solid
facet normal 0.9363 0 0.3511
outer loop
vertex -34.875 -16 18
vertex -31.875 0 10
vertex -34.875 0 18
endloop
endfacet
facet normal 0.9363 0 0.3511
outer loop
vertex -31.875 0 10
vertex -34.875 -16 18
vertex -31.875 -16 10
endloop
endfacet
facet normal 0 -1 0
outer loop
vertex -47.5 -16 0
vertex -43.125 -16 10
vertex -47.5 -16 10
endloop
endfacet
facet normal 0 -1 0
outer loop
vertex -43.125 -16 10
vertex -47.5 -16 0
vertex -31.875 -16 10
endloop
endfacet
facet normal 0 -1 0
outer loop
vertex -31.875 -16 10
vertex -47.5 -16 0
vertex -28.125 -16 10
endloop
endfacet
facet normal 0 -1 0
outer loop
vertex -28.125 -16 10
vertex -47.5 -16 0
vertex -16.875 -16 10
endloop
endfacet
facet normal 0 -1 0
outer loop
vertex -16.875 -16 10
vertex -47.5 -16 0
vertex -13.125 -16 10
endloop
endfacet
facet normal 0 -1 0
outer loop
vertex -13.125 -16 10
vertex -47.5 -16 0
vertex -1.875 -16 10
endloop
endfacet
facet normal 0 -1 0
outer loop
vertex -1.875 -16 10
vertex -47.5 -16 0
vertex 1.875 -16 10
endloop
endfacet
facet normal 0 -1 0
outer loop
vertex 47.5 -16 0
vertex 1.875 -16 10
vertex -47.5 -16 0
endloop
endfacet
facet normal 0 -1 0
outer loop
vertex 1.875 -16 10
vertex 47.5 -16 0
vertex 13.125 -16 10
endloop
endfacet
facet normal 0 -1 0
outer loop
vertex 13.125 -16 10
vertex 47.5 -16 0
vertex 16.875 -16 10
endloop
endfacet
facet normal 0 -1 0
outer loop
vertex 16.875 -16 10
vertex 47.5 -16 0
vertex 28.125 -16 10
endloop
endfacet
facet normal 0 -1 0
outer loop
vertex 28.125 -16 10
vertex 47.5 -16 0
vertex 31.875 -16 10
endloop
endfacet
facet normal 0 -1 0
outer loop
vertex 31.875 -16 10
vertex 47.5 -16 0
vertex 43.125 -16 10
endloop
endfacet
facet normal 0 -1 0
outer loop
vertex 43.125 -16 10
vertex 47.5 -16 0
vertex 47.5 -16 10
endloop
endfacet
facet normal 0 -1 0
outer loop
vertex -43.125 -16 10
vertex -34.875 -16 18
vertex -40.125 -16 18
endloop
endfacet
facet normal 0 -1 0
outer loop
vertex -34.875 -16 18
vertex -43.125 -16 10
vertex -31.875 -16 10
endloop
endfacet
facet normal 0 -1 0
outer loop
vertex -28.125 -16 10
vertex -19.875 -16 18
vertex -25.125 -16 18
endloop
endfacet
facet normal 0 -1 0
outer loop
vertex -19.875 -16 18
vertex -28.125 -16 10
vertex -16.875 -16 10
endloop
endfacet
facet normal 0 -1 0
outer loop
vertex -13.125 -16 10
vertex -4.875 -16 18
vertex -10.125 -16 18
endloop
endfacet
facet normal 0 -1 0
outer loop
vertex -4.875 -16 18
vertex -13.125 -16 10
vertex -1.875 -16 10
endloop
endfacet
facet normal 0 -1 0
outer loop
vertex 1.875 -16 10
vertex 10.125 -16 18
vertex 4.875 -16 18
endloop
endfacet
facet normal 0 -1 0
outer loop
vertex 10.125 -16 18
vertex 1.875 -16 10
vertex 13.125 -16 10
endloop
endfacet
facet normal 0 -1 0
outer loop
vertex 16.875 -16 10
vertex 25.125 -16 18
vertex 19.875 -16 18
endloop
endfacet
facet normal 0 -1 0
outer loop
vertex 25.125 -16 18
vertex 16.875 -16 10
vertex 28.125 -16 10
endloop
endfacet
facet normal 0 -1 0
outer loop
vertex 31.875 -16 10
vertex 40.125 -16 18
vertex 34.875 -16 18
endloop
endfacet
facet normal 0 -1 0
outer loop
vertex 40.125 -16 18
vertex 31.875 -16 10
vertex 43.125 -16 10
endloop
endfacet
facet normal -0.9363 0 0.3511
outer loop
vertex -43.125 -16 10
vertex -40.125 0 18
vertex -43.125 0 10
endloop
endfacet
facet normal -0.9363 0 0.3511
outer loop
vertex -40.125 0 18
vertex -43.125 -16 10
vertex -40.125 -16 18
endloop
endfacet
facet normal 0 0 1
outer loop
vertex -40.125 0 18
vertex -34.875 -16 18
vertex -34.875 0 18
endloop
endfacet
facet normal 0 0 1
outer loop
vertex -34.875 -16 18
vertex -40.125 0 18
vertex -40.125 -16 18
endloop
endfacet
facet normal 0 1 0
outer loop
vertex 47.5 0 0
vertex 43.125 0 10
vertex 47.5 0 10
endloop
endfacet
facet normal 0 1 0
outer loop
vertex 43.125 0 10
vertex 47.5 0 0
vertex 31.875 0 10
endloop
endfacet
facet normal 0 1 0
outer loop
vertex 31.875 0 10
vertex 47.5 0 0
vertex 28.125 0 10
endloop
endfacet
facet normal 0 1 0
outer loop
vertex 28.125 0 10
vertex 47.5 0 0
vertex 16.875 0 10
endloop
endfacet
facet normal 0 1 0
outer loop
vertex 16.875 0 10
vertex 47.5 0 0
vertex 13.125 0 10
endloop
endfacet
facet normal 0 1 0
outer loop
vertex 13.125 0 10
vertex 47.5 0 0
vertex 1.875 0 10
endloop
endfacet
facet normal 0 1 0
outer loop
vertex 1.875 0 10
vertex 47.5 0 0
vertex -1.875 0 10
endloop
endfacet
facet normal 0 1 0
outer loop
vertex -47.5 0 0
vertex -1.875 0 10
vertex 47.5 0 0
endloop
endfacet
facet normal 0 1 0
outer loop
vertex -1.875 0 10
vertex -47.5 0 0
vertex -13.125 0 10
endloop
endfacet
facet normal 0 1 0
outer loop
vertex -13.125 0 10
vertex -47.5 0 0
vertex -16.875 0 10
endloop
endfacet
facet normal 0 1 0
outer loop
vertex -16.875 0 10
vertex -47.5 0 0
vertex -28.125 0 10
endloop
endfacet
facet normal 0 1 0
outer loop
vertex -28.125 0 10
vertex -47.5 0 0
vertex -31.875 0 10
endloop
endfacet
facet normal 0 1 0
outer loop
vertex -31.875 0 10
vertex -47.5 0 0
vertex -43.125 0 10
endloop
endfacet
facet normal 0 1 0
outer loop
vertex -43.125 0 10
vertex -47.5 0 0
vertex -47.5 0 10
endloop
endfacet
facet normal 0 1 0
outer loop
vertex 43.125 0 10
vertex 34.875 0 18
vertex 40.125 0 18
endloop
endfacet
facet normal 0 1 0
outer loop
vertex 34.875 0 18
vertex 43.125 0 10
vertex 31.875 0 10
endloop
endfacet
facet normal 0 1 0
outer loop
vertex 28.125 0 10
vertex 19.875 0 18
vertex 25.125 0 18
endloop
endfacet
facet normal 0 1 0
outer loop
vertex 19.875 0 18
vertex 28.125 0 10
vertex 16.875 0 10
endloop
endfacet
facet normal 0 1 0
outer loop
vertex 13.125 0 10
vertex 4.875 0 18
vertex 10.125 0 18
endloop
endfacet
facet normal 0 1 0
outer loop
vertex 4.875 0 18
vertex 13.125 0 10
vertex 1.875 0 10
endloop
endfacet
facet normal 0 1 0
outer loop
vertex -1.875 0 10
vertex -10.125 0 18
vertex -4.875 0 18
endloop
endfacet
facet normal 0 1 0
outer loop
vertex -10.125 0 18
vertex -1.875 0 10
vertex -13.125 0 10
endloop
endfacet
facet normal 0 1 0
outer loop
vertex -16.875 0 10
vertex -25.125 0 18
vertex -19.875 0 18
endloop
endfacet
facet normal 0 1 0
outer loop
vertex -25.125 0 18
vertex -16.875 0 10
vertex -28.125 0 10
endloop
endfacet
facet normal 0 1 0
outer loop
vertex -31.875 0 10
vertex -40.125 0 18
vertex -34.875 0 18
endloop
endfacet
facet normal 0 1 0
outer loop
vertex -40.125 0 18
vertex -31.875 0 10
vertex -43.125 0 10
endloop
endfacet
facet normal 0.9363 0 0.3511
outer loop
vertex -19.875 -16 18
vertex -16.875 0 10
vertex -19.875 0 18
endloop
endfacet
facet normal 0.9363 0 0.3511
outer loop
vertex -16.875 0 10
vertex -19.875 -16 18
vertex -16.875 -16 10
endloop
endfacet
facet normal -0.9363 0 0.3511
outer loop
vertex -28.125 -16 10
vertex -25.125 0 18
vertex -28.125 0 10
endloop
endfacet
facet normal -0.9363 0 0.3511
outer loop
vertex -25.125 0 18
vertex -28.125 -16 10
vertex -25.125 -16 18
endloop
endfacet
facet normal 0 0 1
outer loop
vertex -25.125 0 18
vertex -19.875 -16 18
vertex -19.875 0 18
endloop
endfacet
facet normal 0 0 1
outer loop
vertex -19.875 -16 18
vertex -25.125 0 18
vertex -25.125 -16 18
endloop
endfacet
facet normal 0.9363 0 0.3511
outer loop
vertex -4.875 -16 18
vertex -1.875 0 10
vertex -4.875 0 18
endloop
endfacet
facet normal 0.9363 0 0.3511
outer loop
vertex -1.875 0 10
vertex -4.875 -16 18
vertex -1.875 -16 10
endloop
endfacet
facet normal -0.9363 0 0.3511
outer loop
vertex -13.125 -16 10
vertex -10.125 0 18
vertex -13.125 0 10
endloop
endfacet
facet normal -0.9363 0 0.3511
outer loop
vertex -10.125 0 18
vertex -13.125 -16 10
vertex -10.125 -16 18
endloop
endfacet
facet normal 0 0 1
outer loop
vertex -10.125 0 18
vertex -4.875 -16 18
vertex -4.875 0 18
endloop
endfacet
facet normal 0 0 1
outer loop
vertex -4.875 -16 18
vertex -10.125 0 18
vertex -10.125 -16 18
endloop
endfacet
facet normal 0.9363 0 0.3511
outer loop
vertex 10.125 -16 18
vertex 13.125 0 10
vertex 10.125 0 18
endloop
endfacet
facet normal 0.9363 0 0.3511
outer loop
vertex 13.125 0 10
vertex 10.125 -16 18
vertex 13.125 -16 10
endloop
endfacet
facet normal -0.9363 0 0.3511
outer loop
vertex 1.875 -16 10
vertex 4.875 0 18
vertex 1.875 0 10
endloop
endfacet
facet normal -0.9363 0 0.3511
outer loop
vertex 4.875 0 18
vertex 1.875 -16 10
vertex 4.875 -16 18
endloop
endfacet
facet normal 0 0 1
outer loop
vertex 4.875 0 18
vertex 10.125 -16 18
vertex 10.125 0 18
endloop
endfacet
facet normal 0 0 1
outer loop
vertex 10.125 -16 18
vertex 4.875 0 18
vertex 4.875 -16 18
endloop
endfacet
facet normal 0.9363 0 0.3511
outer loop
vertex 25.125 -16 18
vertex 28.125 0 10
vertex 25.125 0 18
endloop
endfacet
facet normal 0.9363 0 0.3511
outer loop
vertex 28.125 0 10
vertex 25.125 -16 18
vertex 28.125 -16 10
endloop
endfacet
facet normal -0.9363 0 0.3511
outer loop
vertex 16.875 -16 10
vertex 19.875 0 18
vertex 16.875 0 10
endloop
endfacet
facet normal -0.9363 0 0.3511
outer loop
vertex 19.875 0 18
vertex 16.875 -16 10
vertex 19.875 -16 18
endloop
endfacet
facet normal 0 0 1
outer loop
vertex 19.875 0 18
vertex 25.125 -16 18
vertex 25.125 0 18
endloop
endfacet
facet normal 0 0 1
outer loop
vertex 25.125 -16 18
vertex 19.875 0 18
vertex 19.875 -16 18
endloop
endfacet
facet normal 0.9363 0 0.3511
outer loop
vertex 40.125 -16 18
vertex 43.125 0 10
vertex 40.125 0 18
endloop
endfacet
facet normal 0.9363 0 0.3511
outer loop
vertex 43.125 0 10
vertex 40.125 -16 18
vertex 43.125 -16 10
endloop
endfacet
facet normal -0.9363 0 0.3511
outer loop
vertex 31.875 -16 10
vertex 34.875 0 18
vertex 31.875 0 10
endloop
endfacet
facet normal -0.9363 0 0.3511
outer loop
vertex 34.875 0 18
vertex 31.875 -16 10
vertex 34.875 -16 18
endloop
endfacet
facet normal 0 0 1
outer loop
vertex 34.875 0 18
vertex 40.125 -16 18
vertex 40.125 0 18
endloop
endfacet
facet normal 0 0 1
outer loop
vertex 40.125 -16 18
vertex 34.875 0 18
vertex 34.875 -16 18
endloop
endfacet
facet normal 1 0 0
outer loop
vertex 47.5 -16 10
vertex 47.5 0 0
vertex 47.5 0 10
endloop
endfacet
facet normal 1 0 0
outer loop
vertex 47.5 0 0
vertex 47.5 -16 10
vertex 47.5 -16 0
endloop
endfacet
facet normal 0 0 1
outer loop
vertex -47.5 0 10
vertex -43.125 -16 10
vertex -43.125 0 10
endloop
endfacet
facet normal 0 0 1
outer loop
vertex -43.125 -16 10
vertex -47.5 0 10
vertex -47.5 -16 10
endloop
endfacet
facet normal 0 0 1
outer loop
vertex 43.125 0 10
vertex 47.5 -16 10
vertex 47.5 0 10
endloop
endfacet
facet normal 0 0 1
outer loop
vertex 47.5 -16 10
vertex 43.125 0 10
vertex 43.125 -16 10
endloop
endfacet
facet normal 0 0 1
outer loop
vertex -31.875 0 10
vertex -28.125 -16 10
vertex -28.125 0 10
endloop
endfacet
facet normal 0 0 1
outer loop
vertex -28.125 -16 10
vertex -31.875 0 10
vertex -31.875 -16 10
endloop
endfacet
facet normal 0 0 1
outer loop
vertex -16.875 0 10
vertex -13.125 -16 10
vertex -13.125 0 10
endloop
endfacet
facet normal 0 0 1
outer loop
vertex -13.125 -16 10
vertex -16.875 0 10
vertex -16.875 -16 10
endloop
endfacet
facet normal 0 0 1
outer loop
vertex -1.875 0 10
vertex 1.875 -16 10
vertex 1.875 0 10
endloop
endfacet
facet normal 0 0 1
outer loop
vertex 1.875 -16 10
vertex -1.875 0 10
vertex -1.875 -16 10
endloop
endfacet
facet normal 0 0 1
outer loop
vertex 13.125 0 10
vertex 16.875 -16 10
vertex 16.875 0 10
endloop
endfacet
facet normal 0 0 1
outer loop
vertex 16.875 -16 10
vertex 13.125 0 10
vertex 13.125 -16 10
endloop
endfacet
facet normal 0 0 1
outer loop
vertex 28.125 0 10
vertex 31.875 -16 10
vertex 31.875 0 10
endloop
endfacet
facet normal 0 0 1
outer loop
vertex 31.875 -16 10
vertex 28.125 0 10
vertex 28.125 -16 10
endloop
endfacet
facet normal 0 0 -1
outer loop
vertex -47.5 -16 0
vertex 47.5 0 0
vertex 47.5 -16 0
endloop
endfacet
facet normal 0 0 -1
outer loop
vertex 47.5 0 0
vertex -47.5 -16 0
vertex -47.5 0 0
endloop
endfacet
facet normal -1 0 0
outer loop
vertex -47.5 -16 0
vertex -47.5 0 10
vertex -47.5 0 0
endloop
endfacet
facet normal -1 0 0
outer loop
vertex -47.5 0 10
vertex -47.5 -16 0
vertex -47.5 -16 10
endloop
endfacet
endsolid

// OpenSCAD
$fn = 32;

// ----------------------------------------------------------------------
// Toothed rack, 6 teeth
// 15 mm pitch, 8 mm teeth
// ----------------------------------------------------------------------

// --- parameters (mm) ---
bar_w = 16;      // bar width (Y)
bar_h = 10;      // bar height (Z)
teeth = 6;       // number of teeth
pitch = 15;      // tooth pitch
tooth_h = 8;     // tooth height above the bar
root_w = 12;     // tooth width at the root
crest_w = 5.25;  // tooth width at the crest

// --- derived feature positions (mm) ---
span = (teeth - 1) * pitch;  // = 75   distance between the outer teeth
bar_l = span + root_w + 8;   // = 95   bar length: teeth plus 4 mm at each end
tooth_x = -span / 2;         // = -37.5   X of the first tooth
height = bar_h + tooth_h;    // = 18   overall height
feature_centers = [
  [tooth_x + 0 * pitch, -bar_w / 2],
  [tooth_x + 1 * pitch, -bar_w / 2],
  [tooth_x + 2 * pitch, -bar_w / 2],
  [tooth_x + 3 * pitch, -bar_w / 2],
  [tooth_x + 4 * pitch, -bar_w / 2],
  [tooth_x + 5 * pitch, -bar_w / 2]
];   // tooth centre line, drives the tooth loop

// bar with a rack of teeth, one extruded trapezoium per centre
module rack_tooth() {
  linear_extrude(height = bar_w)
    polygon(points = [
      [0, 0],
      [root_w, 0],
      [root_w / 2 + crest_w / 2, tooth_h + 1],
      [root_w / 2 - crest_w / 2, tooth_h + 1]
    ]);
}

union() {
  translate([-bar_l / 2, -bar_w, 0]) cube([bar_l, bar_w, bar_h]);
  for (centre = feature_centers)
    translate([centre[0] - root_w / 2, 0, bar_h - 1]) rotate([90, 0, 0]) rack_tooth();
}
